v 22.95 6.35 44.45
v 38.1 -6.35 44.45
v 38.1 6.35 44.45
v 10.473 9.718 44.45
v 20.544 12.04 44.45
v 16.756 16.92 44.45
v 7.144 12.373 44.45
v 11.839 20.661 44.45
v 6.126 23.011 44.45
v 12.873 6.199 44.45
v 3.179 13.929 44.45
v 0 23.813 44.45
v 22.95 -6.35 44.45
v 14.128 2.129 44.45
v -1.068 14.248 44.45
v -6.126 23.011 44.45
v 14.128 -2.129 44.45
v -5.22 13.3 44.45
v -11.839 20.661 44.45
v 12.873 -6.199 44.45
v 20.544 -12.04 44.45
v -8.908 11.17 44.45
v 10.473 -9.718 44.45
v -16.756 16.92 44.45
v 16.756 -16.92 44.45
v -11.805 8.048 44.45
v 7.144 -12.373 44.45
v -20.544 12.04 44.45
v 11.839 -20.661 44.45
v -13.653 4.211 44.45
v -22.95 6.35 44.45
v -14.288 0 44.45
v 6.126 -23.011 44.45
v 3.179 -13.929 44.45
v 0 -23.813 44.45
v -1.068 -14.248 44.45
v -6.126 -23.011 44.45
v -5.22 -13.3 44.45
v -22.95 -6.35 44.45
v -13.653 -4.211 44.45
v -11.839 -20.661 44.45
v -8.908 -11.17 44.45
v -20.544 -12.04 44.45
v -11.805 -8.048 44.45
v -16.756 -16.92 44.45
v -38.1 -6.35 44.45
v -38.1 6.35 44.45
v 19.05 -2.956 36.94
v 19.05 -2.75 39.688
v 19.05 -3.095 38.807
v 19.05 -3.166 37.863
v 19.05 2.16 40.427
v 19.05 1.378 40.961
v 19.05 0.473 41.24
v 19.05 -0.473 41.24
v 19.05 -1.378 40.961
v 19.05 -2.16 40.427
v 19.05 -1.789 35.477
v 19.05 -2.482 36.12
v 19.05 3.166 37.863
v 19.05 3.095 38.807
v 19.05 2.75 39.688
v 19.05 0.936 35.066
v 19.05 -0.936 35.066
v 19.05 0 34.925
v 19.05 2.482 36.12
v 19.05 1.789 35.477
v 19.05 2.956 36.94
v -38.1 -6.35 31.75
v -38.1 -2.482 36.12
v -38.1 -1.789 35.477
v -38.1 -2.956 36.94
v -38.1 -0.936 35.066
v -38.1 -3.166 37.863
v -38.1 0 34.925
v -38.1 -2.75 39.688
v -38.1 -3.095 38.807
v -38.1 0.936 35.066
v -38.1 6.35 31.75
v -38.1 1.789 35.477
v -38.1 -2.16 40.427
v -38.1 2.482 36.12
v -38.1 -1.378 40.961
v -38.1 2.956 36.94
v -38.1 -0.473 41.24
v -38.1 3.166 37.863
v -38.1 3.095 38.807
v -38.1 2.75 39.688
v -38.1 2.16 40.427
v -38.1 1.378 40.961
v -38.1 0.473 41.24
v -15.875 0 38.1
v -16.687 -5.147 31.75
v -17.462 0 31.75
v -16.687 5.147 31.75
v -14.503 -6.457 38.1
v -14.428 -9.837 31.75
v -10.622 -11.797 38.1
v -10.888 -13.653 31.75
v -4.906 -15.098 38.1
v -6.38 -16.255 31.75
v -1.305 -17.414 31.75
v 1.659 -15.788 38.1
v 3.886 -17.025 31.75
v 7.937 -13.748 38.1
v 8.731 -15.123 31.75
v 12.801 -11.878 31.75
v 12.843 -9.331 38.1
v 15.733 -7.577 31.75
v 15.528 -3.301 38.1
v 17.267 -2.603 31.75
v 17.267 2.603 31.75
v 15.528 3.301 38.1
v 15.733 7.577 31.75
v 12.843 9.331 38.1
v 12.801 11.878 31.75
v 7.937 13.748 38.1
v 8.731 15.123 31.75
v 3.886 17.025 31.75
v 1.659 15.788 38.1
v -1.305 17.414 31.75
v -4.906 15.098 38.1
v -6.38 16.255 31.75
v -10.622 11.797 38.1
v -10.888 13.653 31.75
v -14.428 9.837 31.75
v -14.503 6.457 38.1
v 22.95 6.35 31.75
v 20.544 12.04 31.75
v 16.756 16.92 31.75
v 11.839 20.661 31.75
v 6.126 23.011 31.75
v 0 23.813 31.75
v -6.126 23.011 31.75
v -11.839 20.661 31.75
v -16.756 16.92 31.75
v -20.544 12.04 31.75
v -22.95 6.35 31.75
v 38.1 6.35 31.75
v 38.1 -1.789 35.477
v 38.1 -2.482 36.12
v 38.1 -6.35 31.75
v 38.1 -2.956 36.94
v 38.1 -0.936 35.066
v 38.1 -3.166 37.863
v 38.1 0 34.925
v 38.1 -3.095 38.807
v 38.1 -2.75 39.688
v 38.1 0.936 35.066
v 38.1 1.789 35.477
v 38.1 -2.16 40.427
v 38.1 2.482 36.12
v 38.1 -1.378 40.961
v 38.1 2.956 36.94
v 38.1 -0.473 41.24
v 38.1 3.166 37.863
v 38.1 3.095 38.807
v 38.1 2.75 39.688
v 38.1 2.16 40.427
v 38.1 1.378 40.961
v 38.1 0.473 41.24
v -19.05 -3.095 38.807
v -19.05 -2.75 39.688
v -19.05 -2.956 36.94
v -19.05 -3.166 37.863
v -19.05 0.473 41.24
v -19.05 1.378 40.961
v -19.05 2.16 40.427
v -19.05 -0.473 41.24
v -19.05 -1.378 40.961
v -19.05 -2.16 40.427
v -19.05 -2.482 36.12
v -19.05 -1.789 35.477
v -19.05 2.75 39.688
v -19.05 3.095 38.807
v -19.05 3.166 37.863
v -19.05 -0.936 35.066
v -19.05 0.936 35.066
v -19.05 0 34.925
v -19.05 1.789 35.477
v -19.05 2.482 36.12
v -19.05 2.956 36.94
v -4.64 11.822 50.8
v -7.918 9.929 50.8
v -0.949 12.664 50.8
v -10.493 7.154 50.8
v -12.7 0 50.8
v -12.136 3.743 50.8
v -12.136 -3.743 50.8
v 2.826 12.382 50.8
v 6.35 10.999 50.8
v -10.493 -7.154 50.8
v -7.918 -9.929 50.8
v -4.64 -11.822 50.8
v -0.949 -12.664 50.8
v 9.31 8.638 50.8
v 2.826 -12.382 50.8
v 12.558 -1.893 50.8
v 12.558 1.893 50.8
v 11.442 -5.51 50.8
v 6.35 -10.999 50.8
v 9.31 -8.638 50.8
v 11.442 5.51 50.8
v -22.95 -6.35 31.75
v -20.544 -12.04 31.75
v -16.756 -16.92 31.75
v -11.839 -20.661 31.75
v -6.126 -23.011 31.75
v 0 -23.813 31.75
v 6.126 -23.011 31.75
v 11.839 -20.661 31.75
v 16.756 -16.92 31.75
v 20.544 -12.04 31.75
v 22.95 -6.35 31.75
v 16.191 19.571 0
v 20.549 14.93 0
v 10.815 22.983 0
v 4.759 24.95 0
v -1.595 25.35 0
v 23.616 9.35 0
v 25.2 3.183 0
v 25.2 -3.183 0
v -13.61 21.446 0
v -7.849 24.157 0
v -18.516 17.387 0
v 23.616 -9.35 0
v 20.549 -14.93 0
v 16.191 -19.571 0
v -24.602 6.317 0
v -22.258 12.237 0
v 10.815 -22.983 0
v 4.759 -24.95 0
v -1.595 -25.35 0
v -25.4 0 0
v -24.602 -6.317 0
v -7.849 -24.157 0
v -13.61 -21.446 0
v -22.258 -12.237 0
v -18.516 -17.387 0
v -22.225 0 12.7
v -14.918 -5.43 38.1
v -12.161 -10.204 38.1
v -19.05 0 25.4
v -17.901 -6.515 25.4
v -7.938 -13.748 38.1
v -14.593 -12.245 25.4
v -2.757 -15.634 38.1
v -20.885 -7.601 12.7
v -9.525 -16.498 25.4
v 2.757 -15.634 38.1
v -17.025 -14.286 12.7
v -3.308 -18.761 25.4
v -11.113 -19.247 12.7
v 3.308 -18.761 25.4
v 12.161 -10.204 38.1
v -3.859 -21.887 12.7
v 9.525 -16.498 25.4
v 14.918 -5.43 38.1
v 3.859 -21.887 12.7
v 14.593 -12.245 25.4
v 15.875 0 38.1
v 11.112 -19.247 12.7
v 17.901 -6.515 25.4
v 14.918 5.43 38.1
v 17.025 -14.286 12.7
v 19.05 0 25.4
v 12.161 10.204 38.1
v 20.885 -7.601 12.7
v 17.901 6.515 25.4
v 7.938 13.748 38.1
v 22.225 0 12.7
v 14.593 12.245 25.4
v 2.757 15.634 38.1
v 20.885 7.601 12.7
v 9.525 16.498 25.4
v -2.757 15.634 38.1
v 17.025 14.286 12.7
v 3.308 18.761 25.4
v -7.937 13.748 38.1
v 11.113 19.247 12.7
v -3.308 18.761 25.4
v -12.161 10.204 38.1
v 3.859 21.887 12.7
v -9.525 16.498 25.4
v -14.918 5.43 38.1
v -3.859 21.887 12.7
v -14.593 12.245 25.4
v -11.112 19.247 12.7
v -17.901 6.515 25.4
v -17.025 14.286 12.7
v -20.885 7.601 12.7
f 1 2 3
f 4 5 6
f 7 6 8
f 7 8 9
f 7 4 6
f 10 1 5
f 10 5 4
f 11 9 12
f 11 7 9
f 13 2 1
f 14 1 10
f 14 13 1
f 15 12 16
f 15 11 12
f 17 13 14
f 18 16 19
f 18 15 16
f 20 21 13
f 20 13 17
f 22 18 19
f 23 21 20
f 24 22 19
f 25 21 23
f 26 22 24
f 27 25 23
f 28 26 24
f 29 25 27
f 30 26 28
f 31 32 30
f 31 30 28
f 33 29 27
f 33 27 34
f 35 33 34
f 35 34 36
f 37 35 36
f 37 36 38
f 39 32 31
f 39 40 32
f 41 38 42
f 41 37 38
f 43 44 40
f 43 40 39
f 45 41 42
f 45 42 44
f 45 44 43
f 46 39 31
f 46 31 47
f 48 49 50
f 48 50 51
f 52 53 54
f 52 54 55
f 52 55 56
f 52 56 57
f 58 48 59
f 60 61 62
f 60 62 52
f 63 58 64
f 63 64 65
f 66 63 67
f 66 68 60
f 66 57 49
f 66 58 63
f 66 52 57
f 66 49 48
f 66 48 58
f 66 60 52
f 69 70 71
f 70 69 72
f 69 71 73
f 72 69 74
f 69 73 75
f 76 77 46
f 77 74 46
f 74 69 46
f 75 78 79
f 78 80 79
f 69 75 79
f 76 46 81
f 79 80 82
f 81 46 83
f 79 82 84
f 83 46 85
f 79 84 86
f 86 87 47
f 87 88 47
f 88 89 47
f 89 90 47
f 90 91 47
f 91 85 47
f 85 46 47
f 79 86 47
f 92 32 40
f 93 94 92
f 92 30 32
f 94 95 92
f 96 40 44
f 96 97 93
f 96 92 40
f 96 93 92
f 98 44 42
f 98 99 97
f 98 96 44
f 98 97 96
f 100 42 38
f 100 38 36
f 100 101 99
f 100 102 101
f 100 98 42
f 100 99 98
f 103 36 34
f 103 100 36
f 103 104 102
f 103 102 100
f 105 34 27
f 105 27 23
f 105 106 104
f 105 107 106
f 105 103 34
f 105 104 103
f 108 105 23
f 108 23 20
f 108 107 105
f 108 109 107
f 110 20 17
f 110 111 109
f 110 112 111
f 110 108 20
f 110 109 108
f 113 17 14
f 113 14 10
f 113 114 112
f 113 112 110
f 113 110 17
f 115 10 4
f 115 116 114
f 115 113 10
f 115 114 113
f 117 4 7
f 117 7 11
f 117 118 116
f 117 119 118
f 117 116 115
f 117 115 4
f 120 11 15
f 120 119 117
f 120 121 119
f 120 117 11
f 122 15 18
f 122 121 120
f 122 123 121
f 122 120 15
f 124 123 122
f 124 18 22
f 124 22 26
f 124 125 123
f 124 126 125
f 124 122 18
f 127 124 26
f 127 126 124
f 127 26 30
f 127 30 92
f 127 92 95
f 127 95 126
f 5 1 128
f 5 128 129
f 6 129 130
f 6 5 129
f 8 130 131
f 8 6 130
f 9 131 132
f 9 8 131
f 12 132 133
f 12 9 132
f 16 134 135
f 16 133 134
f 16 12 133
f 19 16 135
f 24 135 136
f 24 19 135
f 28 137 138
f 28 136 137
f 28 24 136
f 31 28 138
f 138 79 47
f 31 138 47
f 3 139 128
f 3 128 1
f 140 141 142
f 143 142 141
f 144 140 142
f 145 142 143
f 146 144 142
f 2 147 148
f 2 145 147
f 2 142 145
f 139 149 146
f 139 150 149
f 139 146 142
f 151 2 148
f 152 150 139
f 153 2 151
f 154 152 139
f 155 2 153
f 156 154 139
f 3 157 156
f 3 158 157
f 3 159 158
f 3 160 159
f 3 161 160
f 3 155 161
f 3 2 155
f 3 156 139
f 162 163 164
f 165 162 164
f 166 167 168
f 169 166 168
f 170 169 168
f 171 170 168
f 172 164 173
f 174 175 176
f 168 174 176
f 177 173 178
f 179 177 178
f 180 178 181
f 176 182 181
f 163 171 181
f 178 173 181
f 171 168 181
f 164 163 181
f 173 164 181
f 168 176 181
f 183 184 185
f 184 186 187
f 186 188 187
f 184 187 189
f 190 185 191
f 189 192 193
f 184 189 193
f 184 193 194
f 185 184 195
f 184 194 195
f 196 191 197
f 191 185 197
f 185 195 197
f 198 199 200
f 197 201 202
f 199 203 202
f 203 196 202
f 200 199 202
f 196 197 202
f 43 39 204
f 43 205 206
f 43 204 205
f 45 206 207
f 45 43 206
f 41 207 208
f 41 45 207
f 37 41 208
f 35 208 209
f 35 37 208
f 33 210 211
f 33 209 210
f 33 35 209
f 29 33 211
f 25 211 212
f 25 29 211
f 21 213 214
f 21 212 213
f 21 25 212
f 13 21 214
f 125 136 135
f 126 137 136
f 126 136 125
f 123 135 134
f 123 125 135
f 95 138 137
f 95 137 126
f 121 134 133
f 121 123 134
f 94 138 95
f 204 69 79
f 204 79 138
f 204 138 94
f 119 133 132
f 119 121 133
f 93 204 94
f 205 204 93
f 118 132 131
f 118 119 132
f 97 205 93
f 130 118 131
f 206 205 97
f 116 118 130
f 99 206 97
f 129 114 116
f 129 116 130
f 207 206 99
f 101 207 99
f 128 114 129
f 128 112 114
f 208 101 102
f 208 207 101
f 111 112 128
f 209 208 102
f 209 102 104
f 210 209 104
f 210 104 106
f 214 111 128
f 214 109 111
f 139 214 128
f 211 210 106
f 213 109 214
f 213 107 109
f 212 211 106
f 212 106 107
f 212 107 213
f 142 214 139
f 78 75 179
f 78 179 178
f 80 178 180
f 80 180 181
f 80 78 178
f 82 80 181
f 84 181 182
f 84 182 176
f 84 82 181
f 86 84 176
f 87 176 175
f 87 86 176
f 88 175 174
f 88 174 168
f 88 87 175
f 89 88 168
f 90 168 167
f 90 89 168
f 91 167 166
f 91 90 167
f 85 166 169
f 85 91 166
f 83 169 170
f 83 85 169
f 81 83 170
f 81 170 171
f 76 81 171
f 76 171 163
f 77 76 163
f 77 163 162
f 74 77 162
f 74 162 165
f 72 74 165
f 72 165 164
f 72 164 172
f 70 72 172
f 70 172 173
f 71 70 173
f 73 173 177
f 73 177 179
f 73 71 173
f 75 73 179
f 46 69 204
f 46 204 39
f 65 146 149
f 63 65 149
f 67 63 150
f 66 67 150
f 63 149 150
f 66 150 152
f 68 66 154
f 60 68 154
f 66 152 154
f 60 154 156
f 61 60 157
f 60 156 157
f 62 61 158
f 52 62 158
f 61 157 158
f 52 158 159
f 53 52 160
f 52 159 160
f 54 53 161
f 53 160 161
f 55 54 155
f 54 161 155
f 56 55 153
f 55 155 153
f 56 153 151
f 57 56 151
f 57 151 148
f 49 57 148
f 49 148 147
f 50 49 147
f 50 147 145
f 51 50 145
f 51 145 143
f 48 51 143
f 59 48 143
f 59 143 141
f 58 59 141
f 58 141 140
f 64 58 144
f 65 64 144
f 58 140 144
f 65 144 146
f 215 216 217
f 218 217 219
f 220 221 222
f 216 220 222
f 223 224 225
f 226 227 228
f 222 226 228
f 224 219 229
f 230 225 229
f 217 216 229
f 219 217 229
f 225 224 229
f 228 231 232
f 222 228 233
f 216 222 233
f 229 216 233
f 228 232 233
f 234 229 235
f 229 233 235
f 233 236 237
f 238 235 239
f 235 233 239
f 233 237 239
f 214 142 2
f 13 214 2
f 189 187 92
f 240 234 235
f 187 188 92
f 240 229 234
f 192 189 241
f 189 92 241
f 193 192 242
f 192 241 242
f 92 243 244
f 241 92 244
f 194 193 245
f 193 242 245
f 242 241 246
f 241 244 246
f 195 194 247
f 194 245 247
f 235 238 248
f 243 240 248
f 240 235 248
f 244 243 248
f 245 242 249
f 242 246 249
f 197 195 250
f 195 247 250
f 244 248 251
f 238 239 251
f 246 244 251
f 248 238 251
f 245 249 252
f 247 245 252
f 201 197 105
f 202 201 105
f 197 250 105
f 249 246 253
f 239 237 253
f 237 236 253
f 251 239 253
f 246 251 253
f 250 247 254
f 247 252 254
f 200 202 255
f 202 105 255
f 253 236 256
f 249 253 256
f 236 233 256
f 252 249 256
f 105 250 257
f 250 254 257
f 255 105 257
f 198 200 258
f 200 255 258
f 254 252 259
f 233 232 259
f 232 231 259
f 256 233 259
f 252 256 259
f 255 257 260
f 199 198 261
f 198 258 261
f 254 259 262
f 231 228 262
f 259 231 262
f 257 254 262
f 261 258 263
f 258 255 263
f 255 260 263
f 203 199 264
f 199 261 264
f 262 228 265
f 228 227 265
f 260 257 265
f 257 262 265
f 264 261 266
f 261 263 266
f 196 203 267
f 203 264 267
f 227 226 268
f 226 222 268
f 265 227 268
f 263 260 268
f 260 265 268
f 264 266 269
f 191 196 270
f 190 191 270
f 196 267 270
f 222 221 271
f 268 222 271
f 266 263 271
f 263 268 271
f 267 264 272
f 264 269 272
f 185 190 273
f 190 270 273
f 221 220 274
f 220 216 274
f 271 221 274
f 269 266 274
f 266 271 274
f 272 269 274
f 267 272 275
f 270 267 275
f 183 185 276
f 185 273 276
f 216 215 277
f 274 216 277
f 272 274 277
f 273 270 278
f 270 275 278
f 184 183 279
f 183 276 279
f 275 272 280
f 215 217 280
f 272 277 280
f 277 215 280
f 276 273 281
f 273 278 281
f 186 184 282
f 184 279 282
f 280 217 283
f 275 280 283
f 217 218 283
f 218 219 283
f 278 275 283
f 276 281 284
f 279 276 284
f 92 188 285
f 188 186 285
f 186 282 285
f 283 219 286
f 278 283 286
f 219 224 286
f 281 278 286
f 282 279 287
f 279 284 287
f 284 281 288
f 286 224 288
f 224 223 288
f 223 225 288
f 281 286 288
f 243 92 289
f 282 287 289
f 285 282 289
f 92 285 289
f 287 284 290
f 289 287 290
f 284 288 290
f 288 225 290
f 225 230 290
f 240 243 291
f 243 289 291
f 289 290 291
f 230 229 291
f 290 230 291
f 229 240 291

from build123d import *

# Parameters (mm, degrees)
BOSS_EXTRUDE2_REACH      = 102.317
BOSS_EXTRUDE2_END_RADIUS = 23.8125
BOSS_EXTRUDE2_START      = 38.1
SKETCH5_W                = 12.7
SKETCH5_H                = 12.7
SKETCH7_R                = 3.175
CUT_EXTRUDE3_DEPTH       = 19.05


with BuildPart() as part:
    # Sketch1 → Revolve1 (revolve)
    with BuildSketch(Plane.YZ, mode=Mode.PRIVATE) as revolve1_sk:
        Polygon((0, 50.8), (-12.7, 50.8), (-25.4, 0), (0, 0), align=None)
    revolve(revolve1_sk.sketch.rotate(Axis((0, 0, 0), (0, 0, 1)), 270), axis=Axis((0, 0, 0), (0, 0, 1)))


with BuildPart() as body_2:
    # Sketch4 → Revolve2 (revolve)
    with BuildSketch(Plane.YZ, mode=Mode.PRIVATE) as revolve2_sk:
        Polygon((-14.2875, 44.45), (-17.4625, 31.75), (-23.8125, 31.75), (-23.8125, 44.45), align=None)
    revolve(revolve2_sk.sketch.rotate(Axis((0, 0, 0), (0, 0, 1)), 270), axis=Axis((0, 0, 0), (0, 0, 1)))

    # Boss-Extrude2: up to this cylinder (the profile starts outside it)
    boss_extrude2_end = Plane(origin=(0, 0, 38.1), z_dir=(0, 0, -1)) * Cylinder(BOSS_EXTRUDE2_END_RADIUS, 253.259, mode=Mode.PRIVATE)
    # Sketch5 → Boss-Extrude2 (add, up to the surface)
    with BuildSketch(Plane.YZ.offset(BOSS_EXTRUDE2_START), mode=Mode.PRIVATE) as boss_extrude2_sk1:
        with Locations((0, 38.1)):
            Rectangle(SKETCH5_W, SKETCH5_H)
    boss_extrude2_tool1 = extrude(boss_extrude2_sk1.sketch, amount=-BOSS_EXTRUDE2_REACH, mode=Mode.PRIVATE) - boss_extrude2_end
    boss_extrude2 = boss_extrude2_tool1.solids().sort_by_distance((38.1, 0, 38.1))[0]
    add(boss_extrude2)

    # Sketch7 → Cut-Extrude3 (cut)
    with BuildSketch(Plane.YZ.offset(38.1)):
        with Locations(Location((0, 38.1, 0), (0, 0, 270))):
            Circle(SKETCH7_R)
    cut_extrude3 = extrude(amount=-CUT_EXTRUDE3_DEPTH, mode=Mode.SUBTRACT)

    # Mirror3: Boss-Extrude2, Cut-Extrude3 across plane
    add(boss_extrude2.mirror(Plane(origin=(0, 0, 0), x_dir=(0, 0, 1), z_dir=(1, 0, 0))))
    add(cut_extrude3.mirror(Plane(origin=(0, 0, 0), x_dir=(0, 0, 1), z_dir=(1, 0, 0))), mode=Mode.SUBTRACT)


solid = Compound([part.part, body_2.part])
